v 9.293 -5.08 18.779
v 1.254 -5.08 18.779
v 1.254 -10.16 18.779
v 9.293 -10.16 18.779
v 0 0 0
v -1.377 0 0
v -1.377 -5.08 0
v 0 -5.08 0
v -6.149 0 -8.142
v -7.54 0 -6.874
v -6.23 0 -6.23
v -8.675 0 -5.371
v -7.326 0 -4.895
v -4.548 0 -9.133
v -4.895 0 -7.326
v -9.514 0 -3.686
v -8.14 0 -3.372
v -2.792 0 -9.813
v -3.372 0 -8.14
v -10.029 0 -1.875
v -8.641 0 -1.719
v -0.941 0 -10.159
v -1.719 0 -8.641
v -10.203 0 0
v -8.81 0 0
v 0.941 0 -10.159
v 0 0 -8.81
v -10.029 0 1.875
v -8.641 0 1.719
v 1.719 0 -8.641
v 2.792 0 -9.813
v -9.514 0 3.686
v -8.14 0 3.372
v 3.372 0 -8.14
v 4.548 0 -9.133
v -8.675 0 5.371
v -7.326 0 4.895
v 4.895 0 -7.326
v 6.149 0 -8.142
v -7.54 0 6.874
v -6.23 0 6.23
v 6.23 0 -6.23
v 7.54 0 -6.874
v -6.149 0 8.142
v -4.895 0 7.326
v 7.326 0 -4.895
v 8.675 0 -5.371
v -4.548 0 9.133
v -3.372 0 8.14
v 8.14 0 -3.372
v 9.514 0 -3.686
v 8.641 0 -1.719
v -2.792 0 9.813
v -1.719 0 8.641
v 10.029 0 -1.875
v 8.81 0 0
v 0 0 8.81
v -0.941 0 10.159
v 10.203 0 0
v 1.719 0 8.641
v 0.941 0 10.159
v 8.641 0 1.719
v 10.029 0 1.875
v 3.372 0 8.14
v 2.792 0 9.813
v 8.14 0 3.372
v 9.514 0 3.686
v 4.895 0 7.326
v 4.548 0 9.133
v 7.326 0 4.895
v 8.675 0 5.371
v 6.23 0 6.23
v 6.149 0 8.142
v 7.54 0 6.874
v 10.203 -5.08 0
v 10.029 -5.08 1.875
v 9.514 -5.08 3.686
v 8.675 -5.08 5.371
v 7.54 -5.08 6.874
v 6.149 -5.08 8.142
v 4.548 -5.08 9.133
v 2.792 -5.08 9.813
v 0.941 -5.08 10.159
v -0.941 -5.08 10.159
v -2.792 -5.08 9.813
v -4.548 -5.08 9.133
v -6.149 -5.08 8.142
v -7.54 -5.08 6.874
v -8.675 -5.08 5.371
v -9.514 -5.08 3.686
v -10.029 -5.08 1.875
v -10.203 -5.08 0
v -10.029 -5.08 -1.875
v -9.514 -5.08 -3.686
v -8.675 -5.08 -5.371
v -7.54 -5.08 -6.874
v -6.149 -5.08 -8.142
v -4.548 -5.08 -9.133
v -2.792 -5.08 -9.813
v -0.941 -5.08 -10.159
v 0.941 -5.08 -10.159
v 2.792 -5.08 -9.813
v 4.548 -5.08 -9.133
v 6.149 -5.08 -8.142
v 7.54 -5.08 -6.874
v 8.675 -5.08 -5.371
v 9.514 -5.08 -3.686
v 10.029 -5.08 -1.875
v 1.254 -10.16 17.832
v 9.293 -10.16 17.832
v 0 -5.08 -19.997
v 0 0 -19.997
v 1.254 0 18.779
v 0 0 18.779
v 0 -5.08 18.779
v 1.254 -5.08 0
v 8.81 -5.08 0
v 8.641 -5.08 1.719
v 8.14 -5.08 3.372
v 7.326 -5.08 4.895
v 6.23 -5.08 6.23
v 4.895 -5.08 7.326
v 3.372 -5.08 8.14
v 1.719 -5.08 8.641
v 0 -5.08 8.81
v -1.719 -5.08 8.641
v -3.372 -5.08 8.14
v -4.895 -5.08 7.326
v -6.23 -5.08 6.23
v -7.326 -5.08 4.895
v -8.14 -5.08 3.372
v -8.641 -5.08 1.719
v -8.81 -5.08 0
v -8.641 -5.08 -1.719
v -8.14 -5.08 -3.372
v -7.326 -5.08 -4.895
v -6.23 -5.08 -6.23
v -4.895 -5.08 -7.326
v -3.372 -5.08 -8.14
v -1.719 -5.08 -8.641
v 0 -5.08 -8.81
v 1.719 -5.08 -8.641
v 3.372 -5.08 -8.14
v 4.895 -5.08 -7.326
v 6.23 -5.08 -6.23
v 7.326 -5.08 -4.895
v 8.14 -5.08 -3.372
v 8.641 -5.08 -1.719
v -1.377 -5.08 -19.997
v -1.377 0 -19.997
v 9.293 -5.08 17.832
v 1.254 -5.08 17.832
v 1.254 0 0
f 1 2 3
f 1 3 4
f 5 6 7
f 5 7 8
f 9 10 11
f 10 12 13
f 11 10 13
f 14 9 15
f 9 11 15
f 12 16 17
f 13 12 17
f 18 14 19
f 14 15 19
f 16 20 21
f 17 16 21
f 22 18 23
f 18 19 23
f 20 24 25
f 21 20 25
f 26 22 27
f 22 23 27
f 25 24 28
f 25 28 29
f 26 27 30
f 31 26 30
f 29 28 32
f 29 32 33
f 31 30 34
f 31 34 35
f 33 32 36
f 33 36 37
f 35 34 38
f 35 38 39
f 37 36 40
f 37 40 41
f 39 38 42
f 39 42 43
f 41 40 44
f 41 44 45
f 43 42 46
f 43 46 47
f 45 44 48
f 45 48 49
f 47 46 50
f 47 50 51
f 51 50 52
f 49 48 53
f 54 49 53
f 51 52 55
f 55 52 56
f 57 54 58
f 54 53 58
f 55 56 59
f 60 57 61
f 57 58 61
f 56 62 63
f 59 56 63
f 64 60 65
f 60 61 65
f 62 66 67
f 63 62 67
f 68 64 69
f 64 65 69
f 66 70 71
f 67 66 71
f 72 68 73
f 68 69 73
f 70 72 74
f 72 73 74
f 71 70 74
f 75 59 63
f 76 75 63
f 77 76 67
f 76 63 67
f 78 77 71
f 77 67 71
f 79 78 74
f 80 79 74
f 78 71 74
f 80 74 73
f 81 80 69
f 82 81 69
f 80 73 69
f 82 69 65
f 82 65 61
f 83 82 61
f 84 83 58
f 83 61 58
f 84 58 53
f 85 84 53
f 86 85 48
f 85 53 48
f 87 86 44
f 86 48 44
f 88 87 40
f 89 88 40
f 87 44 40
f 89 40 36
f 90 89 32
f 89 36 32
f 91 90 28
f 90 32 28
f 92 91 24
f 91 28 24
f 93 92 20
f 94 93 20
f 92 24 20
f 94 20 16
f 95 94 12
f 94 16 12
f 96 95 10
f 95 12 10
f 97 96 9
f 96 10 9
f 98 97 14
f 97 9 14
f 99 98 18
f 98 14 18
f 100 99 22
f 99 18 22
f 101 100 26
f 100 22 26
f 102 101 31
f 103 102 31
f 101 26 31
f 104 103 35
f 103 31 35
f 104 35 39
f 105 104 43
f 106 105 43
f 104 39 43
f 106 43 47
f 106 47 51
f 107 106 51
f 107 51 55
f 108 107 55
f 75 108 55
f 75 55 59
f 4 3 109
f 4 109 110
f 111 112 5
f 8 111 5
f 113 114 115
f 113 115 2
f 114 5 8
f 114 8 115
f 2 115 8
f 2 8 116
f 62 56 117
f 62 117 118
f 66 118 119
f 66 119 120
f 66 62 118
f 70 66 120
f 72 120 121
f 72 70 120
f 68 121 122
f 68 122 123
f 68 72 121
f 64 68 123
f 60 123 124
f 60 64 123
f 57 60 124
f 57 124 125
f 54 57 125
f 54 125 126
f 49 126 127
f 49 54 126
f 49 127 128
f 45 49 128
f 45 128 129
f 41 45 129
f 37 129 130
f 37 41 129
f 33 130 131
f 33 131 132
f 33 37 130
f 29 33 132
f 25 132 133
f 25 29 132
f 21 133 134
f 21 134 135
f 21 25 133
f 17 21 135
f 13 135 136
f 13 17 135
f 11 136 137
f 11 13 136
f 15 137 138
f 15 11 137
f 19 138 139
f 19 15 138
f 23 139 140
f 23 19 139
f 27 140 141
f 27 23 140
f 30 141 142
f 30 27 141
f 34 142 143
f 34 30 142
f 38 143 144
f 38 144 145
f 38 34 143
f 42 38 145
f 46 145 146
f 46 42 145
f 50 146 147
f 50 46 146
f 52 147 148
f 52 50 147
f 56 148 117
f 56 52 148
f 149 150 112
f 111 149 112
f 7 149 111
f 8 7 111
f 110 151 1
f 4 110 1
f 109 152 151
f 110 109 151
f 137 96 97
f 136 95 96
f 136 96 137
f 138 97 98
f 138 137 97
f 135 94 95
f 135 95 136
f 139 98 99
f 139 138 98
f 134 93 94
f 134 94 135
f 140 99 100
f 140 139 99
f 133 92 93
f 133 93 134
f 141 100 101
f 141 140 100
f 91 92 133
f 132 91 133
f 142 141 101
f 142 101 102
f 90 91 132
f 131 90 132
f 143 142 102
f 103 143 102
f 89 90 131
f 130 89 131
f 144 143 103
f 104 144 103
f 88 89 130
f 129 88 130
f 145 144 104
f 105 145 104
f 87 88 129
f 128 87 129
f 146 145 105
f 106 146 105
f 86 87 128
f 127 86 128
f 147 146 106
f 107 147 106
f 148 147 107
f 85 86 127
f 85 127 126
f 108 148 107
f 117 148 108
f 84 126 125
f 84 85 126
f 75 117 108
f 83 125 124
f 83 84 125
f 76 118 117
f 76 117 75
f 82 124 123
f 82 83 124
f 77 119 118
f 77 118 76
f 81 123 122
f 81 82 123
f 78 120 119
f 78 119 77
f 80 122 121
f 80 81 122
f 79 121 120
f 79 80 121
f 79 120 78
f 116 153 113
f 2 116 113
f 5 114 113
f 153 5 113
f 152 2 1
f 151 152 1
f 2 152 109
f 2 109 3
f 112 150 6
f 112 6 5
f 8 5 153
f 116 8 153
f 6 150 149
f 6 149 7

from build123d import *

# Parameters (mm, degrees)
F0_R     = 10.202736
F0_R_2   = 8.810391
F1_DEPTH = 5.08
F2_W     = 1.253951
F2_H     = 18.779367
F2_W_2   = 1.376597
F2_H_2   = 19.996848
F3_DEPTH = 5.08
F4_W     = 8.039493
F4_H     = 0.947753
F5_DEPTH = 5.08


with BuildPart() as f1:
    # F0 (on Front) → F1 (new body)
    with BuildSketch(Plane.XZ):
        Circle(F0_R)
        Circle(F0_R_2, mode=Mode.SUBTRACT)
    extrude(amount=F1_DEPTH)


with BuildPart() as f3:
    # F2 (on Front) → F3 (new body)
    with BuildSketch(Plane.XZ):
        with Locations((0.626976, 9.389684)):
            Rectangle(F2_W, F2_H)
        with Locations((-0.688298, -9.998424)):
            Rectangle(F2_W_2, F2_H_2)
    extrude(amount=F3_DEPTH)


with BuildPart() as f5:
    # F4 (on face) → F5 (new body)
    with BuildSketch(Plane.XZ.offset(5.08)):
        with Locations((5.273697, 18.30549)):
            Rectangle(F4_W, F4_H)
    extrude(amount=F5_DEPTH)


solid = Compound([f1.part, f3.part, f5.part])
